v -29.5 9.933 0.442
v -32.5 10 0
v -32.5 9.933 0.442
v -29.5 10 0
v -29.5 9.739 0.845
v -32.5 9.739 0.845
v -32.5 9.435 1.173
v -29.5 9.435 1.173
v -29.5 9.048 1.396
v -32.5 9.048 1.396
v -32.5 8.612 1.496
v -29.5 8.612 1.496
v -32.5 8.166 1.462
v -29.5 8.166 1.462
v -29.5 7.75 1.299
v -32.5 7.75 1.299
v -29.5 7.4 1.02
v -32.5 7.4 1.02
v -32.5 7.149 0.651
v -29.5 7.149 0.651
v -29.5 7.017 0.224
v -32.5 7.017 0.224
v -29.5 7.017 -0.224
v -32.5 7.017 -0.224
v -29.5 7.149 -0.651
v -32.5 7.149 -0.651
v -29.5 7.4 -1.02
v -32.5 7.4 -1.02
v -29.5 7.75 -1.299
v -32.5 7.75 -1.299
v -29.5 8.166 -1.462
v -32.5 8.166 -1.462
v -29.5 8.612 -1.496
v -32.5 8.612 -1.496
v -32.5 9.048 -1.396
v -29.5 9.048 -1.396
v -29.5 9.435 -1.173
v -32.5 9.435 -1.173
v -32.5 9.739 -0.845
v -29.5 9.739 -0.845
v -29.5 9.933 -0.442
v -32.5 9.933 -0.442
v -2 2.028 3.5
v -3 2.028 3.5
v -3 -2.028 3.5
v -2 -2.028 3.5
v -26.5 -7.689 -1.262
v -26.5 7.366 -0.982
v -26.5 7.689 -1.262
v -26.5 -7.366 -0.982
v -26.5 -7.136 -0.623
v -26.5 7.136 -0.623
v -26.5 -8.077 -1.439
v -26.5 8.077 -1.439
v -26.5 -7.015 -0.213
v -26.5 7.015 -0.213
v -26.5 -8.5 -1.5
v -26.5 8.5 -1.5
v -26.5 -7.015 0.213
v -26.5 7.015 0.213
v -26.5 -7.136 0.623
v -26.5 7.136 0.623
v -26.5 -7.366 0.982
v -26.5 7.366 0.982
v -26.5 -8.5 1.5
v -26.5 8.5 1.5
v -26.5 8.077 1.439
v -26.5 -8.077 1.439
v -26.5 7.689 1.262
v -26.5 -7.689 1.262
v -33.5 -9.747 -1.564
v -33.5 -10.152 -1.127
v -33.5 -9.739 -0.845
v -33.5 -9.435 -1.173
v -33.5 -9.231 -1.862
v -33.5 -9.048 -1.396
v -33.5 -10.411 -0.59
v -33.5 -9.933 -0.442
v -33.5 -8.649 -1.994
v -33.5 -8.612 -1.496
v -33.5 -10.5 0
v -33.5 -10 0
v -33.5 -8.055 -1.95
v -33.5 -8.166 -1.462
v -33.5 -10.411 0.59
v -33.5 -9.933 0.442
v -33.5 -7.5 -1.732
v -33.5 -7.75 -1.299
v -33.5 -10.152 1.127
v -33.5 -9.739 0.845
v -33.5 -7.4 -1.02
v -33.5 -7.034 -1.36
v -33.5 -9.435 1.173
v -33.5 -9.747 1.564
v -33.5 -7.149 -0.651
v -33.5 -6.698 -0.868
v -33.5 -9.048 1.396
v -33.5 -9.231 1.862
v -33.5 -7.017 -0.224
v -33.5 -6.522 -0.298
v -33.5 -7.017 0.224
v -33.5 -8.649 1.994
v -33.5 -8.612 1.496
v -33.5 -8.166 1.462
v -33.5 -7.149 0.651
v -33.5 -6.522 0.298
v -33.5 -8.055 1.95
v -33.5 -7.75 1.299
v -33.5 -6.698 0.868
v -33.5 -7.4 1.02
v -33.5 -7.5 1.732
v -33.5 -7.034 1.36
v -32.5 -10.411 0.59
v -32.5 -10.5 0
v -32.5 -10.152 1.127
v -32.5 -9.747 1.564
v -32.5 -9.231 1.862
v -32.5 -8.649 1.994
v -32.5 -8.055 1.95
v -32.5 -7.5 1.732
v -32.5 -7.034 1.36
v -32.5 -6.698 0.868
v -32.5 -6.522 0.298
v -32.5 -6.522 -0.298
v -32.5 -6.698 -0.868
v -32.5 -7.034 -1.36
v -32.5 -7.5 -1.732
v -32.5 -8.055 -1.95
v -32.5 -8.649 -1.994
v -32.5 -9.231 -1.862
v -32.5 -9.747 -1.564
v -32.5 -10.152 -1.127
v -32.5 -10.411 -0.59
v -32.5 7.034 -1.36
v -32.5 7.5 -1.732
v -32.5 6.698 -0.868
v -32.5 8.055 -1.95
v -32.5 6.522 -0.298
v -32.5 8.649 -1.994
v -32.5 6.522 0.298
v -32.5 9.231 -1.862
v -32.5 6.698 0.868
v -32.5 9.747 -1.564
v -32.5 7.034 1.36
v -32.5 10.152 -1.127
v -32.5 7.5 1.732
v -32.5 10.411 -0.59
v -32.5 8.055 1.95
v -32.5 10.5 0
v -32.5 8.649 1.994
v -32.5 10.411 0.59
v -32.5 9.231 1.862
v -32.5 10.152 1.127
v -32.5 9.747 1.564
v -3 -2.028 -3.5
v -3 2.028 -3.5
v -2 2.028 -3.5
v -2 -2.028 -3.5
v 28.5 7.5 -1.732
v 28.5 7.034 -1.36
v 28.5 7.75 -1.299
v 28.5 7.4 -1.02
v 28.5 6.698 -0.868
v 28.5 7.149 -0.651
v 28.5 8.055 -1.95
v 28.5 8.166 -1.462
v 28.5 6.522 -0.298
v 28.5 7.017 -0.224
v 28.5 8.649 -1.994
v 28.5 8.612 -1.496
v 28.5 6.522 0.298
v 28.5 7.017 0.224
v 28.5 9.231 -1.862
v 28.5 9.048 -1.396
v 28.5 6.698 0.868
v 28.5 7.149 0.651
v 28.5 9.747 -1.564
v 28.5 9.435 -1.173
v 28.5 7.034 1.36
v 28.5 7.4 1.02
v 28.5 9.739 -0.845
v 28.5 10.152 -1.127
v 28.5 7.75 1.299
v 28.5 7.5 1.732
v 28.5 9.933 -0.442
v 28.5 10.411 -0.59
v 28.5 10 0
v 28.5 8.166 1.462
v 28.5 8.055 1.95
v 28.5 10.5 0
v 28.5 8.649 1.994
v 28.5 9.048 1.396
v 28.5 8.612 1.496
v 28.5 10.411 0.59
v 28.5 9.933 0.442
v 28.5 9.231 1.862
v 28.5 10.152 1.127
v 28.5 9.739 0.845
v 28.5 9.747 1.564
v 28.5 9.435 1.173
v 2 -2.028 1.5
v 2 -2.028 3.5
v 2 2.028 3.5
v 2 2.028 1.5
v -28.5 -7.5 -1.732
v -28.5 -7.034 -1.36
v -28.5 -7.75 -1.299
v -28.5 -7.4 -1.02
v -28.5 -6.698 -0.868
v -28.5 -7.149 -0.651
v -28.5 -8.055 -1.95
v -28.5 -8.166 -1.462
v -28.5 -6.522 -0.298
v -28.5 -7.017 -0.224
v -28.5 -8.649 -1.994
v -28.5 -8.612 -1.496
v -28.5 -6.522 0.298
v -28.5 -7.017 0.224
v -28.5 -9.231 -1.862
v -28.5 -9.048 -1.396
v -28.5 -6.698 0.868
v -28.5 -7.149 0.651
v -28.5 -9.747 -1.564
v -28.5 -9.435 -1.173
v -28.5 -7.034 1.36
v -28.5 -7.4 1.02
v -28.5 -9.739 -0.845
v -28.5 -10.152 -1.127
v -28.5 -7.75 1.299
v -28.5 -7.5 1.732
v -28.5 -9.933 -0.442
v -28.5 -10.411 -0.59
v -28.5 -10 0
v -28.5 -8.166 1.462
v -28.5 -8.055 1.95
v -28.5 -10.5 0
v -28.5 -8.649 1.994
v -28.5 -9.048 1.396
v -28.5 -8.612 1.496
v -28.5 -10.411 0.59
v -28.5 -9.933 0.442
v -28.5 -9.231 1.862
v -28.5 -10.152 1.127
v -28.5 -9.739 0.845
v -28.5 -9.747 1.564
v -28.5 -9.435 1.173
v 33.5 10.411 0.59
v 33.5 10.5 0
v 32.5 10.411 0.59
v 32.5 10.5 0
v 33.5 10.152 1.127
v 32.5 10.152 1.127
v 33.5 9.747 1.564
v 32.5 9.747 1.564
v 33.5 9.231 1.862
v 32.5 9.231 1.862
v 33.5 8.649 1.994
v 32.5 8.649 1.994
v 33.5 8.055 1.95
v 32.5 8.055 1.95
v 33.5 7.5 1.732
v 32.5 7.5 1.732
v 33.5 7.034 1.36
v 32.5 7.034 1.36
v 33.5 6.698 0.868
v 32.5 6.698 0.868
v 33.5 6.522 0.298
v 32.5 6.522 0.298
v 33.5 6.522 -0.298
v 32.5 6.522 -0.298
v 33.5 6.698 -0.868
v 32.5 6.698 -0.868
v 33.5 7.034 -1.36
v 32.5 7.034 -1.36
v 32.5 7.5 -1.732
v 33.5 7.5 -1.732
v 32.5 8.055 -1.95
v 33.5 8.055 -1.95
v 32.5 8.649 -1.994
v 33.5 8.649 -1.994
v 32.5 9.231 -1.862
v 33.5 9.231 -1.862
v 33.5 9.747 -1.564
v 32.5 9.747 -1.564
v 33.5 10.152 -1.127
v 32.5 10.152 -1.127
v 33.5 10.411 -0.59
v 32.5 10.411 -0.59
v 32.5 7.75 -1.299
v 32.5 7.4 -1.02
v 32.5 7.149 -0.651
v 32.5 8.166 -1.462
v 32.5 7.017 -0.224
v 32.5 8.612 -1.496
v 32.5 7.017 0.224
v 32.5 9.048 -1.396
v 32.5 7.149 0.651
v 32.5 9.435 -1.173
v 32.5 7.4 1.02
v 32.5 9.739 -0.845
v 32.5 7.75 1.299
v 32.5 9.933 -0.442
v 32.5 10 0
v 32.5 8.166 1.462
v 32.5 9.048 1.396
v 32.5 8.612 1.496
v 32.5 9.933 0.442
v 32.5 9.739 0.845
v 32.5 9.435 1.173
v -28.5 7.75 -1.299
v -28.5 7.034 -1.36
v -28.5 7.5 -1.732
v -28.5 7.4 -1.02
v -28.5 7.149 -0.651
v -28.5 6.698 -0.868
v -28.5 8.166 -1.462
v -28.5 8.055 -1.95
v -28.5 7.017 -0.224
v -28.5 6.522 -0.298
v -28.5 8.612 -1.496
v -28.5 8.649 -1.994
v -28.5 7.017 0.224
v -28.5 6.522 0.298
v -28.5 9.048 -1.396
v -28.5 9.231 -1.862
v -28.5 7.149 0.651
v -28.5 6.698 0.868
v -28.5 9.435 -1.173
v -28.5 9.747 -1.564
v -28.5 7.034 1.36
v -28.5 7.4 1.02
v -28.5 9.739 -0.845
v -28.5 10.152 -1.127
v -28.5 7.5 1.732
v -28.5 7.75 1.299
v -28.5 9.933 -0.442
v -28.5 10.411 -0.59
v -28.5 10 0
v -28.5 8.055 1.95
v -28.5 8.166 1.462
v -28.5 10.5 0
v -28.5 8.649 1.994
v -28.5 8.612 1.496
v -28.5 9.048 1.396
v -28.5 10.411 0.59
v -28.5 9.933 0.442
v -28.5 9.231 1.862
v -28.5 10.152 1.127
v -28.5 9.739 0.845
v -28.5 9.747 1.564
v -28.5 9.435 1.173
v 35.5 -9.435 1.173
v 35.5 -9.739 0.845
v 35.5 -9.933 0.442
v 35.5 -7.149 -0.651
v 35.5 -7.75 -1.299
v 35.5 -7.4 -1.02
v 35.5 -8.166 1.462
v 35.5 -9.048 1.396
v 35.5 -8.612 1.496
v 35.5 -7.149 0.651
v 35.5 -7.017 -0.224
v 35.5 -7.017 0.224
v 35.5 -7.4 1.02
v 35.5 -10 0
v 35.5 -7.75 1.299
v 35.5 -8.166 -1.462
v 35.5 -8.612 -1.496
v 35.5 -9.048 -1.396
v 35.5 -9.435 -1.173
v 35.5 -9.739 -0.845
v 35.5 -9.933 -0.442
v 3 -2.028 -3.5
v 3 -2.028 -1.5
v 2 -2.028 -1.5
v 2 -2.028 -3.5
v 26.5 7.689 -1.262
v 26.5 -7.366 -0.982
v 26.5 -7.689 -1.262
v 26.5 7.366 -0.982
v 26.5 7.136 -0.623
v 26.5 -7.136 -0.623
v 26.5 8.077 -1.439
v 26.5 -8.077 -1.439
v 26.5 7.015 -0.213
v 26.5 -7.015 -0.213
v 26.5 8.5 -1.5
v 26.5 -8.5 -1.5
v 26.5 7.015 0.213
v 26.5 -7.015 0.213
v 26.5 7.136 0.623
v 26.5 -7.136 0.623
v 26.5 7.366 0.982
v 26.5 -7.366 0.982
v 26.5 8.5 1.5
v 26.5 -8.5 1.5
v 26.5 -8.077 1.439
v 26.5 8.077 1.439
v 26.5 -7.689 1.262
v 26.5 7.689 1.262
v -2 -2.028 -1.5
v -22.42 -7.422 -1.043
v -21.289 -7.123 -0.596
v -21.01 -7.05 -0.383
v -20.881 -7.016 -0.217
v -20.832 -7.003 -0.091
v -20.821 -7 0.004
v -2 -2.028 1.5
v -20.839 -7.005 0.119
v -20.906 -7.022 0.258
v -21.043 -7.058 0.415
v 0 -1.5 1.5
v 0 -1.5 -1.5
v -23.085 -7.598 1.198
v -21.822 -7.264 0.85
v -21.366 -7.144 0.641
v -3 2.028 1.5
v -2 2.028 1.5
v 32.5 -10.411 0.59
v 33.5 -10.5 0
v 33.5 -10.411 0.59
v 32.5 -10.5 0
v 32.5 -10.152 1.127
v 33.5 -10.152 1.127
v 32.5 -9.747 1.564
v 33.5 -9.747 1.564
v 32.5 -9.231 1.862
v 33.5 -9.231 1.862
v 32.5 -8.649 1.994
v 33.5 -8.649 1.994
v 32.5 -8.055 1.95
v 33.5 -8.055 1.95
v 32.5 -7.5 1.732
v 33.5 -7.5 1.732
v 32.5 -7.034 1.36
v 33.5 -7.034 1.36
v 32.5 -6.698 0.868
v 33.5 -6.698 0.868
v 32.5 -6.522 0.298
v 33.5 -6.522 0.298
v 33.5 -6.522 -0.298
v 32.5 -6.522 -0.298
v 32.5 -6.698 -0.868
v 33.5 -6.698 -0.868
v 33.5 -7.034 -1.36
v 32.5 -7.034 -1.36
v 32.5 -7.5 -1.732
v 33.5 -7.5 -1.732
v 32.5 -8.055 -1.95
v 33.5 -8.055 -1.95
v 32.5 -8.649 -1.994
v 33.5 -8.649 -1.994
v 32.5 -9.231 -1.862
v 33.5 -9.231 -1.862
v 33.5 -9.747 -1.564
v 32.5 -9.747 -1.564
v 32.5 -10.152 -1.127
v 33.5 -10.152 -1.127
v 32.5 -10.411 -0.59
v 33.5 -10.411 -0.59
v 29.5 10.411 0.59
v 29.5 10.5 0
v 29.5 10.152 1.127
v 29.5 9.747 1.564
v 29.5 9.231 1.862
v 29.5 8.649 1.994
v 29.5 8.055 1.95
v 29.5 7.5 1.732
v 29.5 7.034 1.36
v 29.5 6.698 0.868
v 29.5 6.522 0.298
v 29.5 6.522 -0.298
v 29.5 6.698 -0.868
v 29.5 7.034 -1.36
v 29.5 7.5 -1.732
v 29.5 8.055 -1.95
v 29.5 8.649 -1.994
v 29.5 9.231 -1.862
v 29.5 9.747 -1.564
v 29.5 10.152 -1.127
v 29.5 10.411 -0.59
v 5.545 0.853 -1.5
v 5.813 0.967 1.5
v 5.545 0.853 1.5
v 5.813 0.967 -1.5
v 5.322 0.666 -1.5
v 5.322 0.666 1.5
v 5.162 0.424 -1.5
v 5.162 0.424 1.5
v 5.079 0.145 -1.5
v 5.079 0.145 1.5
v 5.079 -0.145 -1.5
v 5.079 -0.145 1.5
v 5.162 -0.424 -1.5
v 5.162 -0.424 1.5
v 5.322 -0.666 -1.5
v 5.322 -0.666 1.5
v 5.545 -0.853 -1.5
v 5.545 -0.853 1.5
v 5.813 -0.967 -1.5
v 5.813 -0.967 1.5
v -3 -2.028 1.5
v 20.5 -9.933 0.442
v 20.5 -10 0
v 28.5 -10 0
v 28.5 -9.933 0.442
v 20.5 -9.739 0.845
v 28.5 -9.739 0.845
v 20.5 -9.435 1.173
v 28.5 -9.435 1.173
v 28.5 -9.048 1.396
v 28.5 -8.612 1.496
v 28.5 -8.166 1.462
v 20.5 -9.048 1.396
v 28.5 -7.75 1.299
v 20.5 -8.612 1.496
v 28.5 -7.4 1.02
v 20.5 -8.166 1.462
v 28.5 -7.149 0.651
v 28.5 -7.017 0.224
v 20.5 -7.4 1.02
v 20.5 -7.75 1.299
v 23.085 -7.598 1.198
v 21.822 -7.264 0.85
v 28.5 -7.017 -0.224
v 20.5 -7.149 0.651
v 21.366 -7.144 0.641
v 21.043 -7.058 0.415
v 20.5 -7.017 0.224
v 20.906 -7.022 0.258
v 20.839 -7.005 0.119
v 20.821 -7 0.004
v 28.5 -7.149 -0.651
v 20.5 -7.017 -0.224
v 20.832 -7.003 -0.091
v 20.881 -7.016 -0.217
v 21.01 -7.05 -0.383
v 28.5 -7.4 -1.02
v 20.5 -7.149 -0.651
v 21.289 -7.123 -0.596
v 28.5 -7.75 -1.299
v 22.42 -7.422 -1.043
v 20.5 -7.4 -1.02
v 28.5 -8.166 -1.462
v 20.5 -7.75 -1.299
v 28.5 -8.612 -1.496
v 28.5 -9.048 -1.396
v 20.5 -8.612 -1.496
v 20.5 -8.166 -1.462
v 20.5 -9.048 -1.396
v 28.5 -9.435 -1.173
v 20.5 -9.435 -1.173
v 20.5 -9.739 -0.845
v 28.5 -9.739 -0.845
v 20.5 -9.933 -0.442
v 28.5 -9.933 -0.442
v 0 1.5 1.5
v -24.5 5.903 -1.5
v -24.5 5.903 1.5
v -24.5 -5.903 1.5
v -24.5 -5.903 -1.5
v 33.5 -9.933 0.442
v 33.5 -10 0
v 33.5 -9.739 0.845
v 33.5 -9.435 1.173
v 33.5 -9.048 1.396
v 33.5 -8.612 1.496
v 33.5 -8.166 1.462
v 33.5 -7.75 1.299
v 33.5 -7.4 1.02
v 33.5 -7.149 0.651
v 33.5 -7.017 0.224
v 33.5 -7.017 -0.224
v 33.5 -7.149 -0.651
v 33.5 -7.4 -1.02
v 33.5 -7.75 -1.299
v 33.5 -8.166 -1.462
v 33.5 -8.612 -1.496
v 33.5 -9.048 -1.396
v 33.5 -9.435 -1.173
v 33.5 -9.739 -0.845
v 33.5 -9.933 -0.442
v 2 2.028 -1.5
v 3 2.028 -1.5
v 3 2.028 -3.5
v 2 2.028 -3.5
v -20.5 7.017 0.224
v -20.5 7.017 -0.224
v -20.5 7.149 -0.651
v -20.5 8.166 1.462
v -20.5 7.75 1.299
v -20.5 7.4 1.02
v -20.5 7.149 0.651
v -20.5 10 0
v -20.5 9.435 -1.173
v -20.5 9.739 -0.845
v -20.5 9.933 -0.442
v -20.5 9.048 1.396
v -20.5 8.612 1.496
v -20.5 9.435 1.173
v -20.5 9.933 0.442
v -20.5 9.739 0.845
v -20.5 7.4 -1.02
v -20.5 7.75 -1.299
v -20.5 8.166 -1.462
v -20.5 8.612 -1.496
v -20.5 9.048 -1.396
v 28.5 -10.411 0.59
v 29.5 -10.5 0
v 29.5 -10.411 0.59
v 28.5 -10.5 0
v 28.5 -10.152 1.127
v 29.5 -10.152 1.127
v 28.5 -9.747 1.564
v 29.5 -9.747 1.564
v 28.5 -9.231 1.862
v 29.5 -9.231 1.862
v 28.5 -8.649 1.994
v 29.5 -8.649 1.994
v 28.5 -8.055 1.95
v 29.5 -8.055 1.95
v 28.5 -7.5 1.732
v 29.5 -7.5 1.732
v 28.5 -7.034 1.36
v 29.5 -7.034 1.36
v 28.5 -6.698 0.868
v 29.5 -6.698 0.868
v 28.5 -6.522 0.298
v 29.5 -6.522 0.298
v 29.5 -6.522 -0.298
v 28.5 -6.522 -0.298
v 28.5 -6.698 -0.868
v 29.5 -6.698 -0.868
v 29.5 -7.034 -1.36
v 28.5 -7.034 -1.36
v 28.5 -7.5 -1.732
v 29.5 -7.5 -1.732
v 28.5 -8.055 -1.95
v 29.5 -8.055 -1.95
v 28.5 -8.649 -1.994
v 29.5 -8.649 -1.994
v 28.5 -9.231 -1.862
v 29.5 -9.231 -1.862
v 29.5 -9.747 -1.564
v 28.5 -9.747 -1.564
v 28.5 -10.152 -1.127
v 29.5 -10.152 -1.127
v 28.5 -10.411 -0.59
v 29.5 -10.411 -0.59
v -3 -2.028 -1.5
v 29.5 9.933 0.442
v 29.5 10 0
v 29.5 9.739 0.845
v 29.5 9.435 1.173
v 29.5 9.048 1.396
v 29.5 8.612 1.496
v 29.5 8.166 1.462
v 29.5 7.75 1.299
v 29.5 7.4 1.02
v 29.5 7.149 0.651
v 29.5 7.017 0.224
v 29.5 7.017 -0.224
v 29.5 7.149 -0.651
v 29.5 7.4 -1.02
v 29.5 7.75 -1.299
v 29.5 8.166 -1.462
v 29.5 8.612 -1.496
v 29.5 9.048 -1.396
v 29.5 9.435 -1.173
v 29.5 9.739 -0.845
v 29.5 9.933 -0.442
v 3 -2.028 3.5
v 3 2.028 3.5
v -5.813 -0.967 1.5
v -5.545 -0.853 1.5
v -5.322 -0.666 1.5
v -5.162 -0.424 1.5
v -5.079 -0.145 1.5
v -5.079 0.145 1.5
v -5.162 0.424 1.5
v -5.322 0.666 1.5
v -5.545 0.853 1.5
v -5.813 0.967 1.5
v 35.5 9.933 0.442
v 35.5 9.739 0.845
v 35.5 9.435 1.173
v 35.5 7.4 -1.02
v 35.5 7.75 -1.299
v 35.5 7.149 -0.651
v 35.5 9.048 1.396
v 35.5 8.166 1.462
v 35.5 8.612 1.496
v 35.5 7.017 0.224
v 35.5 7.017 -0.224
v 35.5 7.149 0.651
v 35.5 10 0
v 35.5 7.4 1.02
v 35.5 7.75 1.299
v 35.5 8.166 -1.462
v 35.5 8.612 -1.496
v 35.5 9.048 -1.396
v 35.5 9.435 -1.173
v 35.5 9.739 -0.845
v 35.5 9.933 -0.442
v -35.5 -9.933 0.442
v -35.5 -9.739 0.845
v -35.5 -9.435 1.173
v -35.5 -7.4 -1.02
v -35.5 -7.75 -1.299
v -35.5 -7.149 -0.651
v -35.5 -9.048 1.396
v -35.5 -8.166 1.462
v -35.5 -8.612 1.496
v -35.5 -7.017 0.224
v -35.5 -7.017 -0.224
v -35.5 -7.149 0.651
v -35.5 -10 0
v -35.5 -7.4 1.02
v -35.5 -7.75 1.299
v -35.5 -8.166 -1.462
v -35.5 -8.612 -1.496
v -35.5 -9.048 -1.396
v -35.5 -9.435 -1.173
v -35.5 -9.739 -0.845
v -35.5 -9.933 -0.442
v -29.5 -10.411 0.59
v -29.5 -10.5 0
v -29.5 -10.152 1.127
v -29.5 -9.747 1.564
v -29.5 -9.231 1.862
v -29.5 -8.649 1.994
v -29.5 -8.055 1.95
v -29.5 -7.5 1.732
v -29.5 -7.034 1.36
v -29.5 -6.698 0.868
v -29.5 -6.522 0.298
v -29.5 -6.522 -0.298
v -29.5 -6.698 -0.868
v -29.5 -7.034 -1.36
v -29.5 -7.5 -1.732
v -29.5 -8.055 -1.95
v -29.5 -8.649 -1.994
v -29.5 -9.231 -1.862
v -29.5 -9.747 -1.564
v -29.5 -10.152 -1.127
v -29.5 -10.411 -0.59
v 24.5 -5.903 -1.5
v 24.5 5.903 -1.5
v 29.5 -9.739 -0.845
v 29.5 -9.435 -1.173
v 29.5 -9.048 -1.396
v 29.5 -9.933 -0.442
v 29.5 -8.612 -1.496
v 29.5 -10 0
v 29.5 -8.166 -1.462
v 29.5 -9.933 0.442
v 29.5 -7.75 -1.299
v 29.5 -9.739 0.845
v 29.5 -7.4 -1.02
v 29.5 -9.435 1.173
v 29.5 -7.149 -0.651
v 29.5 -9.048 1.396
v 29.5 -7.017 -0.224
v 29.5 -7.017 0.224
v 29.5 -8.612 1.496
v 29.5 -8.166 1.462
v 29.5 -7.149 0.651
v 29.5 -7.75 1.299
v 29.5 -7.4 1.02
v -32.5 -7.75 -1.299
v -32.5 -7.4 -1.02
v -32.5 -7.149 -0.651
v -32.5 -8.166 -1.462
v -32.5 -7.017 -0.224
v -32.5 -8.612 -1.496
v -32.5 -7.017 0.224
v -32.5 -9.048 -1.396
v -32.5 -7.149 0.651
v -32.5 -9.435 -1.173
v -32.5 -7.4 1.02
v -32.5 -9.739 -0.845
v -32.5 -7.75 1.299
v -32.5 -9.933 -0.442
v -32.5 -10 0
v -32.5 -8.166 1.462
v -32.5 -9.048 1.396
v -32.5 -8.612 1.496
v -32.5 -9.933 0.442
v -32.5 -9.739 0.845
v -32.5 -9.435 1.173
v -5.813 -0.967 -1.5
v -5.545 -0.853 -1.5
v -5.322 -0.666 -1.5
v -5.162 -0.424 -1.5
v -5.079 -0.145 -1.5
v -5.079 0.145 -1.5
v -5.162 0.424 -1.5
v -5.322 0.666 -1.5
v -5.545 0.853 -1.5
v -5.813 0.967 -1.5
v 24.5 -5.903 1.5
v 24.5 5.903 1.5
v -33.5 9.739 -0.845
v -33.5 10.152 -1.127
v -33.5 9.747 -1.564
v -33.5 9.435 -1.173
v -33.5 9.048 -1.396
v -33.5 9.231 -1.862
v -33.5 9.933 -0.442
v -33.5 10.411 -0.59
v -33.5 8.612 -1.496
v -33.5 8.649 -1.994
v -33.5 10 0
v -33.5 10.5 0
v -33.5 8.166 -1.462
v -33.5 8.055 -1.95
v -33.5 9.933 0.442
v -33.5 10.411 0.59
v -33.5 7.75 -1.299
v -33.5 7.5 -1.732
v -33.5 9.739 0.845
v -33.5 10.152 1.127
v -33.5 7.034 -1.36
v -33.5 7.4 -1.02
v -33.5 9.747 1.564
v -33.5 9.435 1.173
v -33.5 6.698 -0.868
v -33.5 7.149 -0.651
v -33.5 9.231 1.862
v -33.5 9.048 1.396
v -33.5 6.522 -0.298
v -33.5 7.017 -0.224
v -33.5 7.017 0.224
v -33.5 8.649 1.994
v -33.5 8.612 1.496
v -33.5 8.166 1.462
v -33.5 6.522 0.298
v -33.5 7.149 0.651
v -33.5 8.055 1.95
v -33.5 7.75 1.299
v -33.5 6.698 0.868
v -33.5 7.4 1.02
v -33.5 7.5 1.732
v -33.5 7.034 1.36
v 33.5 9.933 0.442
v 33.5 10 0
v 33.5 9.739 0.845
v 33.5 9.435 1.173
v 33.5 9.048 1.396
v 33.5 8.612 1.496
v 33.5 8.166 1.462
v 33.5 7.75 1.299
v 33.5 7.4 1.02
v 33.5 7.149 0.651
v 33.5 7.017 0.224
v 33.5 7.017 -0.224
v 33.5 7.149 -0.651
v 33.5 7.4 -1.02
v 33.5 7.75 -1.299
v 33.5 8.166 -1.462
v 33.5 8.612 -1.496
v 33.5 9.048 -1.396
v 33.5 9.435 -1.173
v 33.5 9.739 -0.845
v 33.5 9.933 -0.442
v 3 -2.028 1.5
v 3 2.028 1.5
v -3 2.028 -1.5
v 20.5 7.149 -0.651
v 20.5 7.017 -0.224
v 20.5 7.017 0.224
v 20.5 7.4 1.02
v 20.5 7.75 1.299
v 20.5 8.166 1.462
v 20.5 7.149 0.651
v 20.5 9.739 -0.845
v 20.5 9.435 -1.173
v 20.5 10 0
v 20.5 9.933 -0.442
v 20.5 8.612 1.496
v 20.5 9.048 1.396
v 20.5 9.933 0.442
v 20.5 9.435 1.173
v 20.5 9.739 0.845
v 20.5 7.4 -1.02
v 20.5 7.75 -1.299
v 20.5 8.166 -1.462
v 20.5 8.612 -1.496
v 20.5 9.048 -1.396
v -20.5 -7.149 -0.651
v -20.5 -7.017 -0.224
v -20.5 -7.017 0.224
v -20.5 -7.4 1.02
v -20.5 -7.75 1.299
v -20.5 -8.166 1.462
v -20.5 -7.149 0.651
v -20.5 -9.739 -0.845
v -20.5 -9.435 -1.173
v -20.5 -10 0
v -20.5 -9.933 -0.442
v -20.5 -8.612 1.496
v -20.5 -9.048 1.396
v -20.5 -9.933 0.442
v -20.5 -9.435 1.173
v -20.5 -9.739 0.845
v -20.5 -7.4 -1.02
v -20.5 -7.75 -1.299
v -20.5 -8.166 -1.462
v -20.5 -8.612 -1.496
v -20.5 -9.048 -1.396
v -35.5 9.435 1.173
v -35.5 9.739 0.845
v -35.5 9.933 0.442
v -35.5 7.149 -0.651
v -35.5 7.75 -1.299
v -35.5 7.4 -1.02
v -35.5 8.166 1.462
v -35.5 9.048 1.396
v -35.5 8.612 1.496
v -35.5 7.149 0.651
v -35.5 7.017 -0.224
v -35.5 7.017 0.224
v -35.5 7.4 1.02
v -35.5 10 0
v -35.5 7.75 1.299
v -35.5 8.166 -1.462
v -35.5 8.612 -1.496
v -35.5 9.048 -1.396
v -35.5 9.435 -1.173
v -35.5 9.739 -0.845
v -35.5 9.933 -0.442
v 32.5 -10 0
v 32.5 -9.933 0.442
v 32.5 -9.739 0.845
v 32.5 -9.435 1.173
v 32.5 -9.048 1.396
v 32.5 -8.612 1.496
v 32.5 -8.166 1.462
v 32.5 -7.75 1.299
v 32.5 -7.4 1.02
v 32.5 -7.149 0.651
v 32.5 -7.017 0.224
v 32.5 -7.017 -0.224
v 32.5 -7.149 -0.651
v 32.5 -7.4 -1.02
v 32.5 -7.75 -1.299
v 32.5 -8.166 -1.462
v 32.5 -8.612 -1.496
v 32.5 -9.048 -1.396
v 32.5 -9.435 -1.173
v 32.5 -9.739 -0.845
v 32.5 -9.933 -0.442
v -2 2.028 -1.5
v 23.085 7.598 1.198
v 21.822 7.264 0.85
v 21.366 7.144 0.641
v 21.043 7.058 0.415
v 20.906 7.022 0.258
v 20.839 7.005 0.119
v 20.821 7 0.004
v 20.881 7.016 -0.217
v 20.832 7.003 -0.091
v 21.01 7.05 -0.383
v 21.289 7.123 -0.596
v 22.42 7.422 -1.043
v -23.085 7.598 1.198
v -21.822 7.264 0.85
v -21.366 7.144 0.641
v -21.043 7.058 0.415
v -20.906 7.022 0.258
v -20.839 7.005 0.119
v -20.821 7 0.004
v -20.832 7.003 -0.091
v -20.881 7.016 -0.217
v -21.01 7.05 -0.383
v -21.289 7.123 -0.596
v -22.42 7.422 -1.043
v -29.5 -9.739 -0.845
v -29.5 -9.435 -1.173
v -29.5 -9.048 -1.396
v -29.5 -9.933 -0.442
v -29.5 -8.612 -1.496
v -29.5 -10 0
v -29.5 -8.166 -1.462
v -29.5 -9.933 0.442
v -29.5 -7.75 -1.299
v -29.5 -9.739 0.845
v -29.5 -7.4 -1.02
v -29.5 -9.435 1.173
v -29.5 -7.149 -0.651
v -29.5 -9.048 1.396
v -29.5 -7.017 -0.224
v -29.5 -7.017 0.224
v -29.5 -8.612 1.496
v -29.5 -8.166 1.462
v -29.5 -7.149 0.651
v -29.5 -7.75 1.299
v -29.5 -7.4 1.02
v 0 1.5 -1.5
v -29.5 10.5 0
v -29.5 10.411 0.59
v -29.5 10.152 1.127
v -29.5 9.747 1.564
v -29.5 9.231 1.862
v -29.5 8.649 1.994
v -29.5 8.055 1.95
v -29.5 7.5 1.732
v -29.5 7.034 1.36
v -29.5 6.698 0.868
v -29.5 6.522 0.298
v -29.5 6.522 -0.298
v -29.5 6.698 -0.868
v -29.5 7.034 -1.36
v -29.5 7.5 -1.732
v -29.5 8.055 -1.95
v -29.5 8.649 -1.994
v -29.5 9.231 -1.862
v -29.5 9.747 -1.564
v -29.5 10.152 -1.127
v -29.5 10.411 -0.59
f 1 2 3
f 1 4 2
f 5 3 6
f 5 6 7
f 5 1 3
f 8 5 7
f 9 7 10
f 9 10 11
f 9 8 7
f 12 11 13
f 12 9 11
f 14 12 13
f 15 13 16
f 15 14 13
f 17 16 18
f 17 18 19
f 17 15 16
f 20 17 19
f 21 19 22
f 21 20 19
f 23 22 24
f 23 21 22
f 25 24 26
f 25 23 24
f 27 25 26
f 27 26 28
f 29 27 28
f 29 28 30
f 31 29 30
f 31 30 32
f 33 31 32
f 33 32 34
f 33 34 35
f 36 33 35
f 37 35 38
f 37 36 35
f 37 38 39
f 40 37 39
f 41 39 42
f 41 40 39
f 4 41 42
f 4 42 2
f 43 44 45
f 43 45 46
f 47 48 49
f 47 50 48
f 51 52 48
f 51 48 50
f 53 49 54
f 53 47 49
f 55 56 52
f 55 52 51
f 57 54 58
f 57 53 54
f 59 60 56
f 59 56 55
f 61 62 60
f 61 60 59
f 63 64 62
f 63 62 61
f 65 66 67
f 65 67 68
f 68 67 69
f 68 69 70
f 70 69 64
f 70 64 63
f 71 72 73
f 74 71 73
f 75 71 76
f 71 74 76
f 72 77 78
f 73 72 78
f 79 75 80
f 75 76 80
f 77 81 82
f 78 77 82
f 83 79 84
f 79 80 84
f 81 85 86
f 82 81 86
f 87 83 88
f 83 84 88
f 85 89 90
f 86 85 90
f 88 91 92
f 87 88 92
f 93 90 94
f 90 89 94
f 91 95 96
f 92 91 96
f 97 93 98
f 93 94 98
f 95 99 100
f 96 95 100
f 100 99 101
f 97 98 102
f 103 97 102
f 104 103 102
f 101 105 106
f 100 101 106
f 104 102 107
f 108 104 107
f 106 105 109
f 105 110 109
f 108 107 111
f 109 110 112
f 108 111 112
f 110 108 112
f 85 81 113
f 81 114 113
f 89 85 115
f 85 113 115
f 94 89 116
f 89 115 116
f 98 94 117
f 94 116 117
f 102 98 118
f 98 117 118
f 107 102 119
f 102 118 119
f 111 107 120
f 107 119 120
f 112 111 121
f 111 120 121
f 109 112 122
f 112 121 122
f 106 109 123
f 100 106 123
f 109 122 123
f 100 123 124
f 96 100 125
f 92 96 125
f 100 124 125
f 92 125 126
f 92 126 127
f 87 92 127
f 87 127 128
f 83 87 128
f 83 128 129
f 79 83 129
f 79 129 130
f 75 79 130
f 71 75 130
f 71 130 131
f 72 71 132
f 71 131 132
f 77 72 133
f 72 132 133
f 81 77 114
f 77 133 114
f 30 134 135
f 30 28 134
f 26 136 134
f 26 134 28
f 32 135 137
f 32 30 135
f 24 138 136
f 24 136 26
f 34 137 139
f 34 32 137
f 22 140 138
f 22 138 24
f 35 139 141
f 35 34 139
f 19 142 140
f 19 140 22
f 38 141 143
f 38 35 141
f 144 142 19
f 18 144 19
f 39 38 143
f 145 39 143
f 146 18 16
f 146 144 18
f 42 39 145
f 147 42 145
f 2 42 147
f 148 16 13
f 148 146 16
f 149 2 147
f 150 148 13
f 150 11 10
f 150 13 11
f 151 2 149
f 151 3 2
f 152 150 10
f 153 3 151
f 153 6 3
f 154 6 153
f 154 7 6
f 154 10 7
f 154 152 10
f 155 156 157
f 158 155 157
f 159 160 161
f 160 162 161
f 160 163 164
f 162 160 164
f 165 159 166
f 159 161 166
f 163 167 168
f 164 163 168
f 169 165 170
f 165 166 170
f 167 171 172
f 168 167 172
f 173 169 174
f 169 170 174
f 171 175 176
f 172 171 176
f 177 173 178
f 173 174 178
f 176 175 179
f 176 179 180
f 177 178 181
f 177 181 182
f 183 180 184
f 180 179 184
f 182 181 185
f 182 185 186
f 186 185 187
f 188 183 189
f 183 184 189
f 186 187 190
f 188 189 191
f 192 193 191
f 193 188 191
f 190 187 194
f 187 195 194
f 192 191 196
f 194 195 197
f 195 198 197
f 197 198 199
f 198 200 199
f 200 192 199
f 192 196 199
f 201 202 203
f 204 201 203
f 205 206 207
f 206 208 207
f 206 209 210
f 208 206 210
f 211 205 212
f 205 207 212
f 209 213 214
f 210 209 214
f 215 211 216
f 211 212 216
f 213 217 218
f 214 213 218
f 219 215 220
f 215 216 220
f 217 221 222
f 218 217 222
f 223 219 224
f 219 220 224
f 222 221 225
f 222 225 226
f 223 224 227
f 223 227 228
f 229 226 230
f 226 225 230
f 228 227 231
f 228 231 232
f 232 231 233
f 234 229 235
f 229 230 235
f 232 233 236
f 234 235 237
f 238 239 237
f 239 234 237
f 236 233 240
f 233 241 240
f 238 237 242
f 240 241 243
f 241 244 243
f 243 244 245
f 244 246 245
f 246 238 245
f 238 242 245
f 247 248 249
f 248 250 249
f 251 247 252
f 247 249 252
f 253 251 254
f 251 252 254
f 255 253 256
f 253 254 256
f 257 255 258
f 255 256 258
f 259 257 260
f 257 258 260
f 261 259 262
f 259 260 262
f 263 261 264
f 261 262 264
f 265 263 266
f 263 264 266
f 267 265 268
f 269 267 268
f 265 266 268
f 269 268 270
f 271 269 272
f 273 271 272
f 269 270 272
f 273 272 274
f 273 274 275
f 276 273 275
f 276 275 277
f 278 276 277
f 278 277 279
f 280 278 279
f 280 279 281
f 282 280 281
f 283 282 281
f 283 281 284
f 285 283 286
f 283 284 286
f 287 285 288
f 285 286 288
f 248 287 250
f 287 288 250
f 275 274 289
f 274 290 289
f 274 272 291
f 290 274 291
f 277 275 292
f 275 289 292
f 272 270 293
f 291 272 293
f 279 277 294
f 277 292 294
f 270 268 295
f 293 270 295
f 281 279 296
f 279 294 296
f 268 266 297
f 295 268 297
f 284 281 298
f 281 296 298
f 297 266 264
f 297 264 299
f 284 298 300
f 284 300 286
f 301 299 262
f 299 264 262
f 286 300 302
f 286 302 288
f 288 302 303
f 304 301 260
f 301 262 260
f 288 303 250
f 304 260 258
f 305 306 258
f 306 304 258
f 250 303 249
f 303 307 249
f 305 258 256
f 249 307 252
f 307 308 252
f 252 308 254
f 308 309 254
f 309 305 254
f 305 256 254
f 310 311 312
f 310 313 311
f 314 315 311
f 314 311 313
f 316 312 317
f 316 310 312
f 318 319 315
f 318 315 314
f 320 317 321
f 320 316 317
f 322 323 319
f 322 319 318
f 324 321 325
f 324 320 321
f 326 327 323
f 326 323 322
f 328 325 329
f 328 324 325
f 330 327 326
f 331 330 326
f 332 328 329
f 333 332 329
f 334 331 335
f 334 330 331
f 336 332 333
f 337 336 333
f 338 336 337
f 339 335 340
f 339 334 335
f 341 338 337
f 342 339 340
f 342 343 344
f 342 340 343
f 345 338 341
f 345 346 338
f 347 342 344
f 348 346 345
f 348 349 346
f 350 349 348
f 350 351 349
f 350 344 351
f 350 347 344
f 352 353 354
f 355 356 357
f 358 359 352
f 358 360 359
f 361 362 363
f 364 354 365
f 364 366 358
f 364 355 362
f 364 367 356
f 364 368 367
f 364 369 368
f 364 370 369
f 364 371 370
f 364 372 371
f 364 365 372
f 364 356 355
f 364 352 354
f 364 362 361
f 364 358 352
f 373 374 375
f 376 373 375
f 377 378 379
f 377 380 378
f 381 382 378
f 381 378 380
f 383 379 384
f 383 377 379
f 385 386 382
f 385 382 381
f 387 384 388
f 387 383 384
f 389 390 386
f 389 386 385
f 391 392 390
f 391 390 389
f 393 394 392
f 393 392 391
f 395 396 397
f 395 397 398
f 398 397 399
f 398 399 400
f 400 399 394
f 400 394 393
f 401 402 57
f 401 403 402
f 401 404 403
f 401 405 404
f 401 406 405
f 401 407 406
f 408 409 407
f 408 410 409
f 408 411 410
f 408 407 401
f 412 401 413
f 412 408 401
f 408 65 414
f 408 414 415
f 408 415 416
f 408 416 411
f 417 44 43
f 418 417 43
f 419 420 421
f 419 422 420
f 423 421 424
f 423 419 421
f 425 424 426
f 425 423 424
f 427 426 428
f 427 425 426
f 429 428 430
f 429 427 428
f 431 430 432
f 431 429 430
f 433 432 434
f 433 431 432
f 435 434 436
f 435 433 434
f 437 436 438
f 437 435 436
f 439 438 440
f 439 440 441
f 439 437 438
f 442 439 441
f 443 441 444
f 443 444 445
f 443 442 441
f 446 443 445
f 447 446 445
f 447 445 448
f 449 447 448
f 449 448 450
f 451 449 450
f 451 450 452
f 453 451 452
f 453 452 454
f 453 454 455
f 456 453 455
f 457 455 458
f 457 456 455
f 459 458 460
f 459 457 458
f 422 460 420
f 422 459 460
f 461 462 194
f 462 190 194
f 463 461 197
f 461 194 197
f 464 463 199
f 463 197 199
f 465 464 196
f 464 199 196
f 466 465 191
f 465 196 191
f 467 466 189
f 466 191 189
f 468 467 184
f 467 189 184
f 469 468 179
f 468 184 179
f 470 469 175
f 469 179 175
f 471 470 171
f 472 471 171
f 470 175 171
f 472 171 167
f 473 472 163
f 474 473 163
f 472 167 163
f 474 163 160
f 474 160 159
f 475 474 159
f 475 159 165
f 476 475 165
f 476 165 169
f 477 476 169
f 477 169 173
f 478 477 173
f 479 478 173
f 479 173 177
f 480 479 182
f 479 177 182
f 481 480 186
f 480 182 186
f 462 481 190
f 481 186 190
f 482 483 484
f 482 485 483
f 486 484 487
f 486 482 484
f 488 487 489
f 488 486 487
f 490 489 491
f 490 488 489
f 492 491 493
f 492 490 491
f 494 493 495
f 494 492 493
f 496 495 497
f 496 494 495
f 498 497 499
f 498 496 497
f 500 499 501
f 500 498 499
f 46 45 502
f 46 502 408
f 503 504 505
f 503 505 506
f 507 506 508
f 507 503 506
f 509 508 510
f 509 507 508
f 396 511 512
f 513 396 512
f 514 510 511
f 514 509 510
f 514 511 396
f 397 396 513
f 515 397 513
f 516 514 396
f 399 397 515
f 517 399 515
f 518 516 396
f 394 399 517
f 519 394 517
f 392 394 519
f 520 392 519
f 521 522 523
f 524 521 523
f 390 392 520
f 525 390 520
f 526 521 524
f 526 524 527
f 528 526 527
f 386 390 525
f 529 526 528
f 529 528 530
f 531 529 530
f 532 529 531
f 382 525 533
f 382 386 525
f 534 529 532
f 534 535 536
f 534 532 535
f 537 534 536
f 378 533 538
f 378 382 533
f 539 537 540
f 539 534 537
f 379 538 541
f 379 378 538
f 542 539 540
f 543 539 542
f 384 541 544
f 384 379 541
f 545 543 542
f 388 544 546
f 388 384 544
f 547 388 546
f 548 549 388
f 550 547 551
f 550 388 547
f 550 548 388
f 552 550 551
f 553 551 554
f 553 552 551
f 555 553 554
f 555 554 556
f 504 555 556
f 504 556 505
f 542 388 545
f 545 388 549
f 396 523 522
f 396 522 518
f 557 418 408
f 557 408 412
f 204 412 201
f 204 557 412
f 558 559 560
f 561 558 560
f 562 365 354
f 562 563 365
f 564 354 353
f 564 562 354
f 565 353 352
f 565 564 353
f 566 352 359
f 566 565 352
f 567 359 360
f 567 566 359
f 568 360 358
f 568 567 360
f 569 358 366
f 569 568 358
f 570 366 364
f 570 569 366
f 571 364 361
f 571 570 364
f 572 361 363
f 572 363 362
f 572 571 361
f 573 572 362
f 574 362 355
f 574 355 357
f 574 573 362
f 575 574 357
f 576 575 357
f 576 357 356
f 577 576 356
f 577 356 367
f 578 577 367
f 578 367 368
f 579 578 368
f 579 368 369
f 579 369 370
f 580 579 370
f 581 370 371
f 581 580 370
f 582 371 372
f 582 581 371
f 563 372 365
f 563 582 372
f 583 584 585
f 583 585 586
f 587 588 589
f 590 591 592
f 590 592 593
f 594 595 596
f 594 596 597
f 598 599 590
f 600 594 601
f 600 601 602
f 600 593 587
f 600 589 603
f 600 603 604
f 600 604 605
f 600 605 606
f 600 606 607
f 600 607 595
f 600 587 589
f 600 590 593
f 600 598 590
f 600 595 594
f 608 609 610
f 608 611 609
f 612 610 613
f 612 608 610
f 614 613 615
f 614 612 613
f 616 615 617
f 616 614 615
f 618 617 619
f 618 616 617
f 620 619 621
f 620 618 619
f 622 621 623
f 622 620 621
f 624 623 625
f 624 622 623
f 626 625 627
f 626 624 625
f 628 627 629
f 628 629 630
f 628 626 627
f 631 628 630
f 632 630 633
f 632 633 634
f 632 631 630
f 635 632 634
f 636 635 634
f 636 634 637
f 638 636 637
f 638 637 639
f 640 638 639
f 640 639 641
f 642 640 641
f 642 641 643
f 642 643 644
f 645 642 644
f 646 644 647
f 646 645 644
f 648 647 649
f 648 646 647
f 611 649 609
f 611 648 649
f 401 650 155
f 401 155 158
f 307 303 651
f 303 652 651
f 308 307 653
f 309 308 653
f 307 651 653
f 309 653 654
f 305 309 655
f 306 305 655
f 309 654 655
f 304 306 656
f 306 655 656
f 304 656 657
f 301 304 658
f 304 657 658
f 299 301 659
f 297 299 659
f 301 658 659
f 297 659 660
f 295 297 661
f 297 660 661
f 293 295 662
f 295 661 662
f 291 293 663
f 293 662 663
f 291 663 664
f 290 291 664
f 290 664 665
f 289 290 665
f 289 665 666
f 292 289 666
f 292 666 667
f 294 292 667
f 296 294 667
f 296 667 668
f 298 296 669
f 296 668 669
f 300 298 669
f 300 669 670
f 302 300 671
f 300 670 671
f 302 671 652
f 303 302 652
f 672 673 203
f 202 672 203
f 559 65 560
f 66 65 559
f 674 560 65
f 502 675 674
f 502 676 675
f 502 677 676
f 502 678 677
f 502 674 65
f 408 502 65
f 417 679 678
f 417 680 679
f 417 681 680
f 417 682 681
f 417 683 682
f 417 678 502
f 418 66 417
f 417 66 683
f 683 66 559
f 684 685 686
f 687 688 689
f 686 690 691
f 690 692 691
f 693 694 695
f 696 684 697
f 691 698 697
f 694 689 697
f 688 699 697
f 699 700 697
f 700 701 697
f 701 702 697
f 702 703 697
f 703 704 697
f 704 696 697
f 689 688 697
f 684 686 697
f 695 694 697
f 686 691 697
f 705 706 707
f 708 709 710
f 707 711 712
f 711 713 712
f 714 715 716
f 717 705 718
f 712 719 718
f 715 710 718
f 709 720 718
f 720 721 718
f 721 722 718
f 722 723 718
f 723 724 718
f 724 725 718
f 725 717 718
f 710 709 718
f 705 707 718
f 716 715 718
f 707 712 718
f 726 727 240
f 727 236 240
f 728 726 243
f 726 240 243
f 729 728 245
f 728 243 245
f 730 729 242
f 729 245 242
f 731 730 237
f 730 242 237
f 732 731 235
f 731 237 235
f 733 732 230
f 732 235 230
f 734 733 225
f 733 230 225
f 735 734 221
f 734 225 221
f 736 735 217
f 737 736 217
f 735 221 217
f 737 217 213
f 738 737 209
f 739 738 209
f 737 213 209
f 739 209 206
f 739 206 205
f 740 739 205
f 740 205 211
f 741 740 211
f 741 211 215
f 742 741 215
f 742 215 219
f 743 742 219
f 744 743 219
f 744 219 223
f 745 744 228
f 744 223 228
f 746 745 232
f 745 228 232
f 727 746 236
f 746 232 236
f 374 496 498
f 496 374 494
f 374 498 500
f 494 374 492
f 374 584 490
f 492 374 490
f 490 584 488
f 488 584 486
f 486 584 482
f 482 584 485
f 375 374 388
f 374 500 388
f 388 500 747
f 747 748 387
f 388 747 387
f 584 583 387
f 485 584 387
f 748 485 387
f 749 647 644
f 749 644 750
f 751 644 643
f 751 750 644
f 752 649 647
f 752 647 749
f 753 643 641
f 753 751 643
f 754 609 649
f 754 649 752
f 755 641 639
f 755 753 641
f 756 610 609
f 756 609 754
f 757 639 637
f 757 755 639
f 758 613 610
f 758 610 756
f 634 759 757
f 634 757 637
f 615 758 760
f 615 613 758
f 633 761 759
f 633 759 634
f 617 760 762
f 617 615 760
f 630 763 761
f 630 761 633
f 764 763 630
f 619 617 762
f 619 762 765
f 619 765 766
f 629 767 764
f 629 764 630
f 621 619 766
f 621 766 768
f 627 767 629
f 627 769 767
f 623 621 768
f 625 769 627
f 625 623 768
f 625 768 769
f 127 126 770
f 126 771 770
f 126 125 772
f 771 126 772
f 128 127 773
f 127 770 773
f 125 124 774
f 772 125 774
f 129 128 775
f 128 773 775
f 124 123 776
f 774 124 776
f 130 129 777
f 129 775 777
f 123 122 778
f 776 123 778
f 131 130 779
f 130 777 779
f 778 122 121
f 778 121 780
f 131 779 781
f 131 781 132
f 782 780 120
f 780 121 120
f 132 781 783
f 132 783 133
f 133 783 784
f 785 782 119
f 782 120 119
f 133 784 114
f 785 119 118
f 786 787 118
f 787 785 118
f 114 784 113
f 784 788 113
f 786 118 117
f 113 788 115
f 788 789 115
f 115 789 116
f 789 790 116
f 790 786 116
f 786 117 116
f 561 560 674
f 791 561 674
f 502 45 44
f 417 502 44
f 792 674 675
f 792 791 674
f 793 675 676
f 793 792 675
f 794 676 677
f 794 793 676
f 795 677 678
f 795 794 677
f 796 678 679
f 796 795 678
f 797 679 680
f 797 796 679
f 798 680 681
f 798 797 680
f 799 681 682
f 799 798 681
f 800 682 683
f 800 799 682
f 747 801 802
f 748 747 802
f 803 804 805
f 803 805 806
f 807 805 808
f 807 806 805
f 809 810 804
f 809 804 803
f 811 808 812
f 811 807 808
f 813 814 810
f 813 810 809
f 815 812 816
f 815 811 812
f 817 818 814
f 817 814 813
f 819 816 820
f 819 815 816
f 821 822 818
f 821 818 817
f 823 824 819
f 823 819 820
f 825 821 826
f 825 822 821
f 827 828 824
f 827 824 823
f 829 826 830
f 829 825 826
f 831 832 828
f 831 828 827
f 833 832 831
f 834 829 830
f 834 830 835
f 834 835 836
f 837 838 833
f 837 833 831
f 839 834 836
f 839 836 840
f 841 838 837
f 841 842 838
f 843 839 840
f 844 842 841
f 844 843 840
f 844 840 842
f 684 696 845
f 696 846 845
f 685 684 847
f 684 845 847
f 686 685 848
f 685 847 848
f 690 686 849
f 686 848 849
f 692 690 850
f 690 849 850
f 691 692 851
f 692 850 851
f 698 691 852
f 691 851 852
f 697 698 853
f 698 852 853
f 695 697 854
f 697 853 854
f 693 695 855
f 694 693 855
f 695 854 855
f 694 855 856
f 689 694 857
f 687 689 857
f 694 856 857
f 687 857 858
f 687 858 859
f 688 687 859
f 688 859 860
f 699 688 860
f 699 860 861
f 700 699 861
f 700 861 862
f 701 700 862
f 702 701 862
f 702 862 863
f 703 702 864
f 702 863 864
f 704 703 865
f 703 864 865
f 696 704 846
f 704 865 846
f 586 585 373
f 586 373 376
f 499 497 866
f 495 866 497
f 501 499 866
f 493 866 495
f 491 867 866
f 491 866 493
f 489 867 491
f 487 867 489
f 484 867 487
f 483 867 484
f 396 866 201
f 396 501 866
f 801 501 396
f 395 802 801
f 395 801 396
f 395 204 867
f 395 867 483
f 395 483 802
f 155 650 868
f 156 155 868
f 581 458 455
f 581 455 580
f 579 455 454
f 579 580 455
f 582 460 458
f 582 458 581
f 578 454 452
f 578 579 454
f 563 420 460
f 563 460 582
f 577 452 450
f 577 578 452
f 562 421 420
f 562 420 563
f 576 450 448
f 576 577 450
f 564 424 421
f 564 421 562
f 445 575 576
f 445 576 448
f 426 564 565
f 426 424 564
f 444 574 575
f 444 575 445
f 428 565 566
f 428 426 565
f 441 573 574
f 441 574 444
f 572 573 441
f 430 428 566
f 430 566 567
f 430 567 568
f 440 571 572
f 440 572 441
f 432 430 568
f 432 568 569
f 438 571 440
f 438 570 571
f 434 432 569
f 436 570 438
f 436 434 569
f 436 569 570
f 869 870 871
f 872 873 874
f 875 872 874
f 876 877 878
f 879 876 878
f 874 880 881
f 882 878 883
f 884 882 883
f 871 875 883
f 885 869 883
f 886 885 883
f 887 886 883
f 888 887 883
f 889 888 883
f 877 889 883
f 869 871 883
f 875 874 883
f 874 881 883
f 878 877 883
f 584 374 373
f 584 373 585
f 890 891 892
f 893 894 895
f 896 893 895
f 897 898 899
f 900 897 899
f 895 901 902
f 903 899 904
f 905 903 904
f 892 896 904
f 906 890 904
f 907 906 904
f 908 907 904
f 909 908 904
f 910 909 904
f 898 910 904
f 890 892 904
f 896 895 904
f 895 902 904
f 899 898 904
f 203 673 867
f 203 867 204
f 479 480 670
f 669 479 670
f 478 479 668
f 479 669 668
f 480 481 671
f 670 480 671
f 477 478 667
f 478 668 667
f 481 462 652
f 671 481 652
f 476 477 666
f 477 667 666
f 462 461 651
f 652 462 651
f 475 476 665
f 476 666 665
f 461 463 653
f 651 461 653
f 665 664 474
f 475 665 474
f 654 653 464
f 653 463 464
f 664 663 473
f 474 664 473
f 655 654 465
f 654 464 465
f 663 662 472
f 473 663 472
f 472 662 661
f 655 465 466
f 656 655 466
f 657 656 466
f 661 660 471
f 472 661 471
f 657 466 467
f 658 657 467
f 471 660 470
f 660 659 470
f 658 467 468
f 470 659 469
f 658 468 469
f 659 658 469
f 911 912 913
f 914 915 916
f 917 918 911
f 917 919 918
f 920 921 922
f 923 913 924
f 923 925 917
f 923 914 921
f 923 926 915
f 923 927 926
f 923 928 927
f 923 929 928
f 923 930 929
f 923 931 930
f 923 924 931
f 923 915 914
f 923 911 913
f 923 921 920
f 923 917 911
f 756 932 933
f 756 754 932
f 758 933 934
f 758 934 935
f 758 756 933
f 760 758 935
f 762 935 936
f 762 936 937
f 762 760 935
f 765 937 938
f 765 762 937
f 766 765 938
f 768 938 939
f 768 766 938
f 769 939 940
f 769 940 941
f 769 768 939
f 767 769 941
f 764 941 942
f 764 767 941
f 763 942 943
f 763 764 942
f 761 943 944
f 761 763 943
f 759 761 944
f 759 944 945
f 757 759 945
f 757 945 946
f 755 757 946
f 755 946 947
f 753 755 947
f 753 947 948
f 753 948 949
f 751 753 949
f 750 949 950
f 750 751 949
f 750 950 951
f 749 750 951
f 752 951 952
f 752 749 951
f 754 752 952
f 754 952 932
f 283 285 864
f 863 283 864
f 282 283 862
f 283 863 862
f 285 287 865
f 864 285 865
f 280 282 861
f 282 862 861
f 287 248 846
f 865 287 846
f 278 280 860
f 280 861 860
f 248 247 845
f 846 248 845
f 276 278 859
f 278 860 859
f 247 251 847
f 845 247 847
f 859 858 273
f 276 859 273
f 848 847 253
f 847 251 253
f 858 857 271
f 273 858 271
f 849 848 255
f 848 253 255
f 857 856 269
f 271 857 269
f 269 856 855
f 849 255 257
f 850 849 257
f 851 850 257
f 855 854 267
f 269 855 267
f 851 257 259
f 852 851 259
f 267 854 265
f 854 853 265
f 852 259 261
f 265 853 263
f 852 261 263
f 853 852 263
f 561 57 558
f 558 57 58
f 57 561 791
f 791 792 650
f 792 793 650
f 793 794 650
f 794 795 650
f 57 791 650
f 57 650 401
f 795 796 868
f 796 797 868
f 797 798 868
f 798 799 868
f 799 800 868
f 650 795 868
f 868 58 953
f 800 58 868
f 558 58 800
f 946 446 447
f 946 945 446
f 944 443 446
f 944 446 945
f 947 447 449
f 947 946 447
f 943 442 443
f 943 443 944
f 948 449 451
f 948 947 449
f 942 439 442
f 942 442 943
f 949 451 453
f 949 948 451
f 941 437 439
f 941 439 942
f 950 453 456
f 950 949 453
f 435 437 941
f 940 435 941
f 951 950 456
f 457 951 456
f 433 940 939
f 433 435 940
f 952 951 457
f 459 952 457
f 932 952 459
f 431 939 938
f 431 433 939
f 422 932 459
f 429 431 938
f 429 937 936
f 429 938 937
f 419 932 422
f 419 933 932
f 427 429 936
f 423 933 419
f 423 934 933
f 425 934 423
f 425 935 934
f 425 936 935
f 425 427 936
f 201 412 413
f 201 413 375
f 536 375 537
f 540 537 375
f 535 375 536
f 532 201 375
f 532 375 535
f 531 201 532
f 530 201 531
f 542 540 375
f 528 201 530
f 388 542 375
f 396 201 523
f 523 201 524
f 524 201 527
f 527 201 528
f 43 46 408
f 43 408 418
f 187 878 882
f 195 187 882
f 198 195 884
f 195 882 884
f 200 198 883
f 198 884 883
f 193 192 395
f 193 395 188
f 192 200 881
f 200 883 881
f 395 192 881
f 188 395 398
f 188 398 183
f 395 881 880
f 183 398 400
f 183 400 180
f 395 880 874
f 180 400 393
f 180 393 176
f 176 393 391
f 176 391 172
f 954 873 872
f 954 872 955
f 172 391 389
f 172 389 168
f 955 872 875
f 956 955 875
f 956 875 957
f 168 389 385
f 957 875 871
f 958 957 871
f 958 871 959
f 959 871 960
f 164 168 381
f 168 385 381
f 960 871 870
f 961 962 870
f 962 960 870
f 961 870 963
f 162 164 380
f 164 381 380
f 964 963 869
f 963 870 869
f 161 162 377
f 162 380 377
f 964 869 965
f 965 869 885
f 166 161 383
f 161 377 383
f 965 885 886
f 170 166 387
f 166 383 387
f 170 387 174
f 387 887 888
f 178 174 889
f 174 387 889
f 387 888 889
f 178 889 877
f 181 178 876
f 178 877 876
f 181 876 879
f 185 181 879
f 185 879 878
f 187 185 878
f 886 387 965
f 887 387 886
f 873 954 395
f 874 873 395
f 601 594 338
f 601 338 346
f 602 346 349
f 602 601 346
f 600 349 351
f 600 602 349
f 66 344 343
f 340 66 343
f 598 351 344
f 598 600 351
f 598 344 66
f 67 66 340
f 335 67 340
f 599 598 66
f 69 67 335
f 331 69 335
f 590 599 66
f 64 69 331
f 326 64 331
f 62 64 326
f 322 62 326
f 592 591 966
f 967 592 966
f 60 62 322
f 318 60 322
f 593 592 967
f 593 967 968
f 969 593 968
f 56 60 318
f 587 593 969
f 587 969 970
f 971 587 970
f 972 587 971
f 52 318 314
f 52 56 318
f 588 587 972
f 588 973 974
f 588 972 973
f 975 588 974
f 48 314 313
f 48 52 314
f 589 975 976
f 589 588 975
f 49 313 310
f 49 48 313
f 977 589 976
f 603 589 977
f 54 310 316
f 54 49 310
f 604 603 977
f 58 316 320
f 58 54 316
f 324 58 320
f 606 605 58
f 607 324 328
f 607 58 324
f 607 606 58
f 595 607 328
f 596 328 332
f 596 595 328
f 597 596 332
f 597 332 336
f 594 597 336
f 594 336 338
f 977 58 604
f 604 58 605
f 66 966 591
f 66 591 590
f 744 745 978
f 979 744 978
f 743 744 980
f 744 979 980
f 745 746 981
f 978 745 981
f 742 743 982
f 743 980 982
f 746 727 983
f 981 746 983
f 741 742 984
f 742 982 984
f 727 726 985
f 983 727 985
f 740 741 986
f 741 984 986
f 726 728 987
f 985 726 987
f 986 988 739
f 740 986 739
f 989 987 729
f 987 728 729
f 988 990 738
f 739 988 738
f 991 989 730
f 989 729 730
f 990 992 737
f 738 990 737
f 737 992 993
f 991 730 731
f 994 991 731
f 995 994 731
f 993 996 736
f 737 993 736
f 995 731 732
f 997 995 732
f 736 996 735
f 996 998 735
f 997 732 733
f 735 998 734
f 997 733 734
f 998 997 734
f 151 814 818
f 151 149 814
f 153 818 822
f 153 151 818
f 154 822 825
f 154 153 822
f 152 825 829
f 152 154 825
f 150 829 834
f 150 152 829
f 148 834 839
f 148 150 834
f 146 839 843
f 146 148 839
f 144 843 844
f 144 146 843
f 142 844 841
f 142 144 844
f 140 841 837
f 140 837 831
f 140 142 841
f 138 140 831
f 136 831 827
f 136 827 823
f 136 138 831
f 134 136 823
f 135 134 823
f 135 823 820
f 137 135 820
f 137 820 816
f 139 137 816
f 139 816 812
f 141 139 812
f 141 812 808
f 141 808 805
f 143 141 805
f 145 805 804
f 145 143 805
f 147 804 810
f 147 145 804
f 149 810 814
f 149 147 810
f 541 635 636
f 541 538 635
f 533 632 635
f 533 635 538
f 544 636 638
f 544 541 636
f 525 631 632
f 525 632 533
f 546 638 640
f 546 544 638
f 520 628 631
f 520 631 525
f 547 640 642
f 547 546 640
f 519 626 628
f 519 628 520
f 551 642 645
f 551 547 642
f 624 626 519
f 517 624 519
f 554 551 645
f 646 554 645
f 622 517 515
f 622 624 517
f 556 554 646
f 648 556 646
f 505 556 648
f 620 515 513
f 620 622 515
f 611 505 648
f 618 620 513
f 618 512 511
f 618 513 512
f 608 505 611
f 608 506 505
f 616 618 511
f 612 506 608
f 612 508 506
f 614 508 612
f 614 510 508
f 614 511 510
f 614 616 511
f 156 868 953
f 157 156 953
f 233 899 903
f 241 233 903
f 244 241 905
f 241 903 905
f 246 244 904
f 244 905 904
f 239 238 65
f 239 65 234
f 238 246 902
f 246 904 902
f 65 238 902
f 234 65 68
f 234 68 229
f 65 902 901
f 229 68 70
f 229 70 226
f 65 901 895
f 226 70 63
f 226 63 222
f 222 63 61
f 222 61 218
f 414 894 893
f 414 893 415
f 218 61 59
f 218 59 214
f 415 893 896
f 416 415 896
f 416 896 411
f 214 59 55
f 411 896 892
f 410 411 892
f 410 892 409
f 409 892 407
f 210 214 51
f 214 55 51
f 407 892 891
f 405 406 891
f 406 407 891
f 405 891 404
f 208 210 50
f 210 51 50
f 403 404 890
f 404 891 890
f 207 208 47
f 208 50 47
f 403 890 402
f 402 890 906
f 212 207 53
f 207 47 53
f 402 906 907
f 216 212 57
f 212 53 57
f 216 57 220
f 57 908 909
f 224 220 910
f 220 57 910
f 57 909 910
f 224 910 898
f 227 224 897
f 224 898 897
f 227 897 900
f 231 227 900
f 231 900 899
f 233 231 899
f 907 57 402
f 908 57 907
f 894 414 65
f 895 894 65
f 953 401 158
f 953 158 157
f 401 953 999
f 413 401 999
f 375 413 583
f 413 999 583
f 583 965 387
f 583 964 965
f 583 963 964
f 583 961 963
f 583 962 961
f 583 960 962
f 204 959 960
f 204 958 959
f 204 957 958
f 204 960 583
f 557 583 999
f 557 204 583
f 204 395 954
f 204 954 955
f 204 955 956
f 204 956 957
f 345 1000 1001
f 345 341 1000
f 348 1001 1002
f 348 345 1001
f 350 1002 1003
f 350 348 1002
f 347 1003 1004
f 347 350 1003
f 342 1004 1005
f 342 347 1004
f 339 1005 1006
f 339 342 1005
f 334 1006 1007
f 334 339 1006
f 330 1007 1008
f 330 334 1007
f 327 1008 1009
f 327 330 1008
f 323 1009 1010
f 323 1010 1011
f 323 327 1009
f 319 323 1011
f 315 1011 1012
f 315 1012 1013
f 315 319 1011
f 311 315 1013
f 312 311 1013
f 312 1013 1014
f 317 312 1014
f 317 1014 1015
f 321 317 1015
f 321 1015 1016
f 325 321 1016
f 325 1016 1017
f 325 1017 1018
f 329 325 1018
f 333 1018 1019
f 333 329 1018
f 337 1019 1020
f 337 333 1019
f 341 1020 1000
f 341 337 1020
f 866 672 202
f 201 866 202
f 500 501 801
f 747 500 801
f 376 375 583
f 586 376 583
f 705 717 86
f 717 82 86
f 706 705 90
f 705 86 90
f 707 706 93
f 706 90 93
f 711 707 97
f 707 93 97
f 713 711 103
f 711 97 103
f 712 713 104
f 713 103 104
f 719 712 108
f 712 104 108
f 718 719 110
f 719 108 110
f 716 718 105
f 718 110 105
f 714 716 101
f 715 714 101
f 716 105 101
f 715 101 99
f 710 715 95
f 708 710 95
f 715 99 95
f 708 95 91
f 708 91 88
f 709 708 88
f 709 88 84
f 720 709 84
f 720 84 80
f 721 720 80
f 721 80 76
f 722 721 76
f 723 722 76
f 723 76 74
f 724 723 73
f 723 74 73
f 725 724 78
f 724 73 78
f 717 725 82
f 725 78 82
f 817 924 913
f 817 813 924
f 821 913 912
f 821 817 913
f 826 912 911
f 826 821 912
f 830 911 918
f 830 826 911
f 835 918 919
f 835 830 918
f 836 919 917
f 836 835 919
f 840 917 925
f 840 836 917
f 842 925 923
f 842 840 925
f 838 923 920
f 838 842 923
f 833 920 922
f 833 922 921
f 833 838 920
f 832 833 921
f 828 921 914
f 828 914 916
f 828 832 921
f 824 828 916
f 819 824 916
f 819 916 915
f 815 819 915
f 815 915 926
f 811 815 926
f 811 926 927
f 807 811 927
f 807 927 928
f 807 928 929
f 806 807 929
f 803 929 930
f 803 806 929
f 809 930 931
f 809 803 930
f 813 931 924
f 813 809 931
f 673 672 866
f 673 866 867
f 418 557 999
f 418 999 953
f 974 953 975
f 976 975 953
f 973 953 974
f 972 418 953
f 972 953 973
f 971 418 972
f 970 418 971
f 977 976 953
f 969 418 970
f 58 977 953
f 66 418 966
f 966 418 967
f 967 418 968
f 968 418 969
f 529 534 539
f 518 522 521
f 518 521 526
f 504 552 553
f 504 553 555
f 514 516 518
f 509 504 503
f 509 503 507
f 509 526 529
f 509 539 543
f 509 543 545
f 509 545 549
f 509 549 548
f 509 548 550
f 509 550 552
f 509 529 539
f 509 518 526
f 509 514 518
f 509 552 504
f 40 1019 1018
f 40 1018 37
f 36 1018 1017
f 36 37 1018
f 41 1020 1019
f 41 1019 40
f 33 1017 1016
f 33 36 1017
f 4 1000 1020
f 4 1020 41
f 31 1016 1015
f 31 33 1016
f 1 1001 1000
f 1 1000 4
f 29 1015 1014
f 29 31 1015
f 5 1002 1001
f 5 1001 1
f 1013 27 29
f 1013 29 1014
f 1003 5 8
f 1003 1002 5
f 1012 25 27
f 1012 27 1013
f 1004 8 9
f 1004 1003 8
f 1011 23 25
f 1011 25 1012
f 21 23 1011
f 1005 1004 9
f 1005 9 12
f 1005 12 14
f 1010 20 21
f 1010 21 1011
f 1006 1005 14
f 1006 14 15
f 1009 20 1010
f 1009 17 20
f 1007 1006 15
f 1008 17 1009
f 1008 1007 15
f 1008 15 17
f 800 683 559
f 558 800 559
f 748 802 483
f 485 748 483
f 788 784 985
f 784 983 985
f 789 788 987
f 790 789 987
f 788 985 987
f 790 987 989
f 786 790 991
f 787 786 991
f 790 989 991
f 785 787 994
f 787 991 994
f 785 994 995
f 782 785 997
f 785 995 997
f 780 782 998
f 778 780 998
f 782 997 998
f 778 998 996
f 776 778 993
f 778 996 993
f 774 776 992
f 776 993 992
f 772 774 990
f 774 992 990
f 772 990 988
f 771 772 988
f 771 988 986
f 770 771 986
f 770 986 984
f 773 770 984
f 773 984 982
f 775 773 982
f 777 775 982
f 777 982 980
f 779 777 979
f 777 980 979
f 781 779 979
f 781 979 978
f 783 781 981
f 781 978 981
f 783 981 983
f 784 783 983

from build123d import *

# Parameters (mm, degrees)
F1_DEPTH = 1.5
F3_DEPTH = 3.001
F4_R     = 1
F7_W     = 1
F7_H     = 4.0566037736
F8_DEPTH = 3.5


# Not quite as in the source:
# - a feature names something its author has since deleted; it is built from what else it names


with BuildPart() as f1:
    # F0 (on Top) → F1 (new body, symmetric)
    with BuildSketch(Plane.XY):
        Polygon((0, 1.5), (-26.5, 8.5), (-26.5, 0), (-26.5, -8.5), (0, -1.5), (26.5, -8.5), (26.5, 0), (26.5, 8.5), align=None)
    extrude(amount=F1_DEPTH, both=True)

    # F2 (on face) → F3 (cut, through all)
    with BuildSketch(Plane.XY.offset(1.5)):
        Polygon((-24.5, 5.9030988568), (-24.5, 0), (-24.5, -5.9030988568), (-2.1525543278, 0), align=None)
        Polygon((24.5, 0), (24.5, 5.9030988568), (2.1525543278, 0), (24.5, -5.9030988568), align=None)
    extrude(amount=-F3_DEPTH, mode=Mode.SUBTRACT)

    # F4
    f4_edges = [f1.edges().sort_by_distance(p)[0] for p in [
        (-2.152554, 0, 0),
        (2.152554, 0, 0),
    ]]
    fillet(f4_edges, radius=F4_R)

    # F5 (on Top) → F6 (revolve)
    with BuildSketch(Plane.XY):
        Polygon((20.5, 8.5), (35.5, 8.5), (35.5, 10), (33.5, 10), (33.5, 10.5), (32.5, 10.5), (32.5, 10), (29.5, 10), (29.5, 10.5), (28.5, 10.5), (28.5, 10), (20.5, 10), align=None)
    revolve(axis=Axis((28, 8.5, 0), (1, 0, 0)))

    # F7 (on Top) → F8 (join, symmetric)
    with BuildSketch(Plane.XY):
        with Locations((-2.5, 0)):
            Rectangle(F7_W, F7_H)
    extrude(amount=F8_DEPTH, both=True)

    # F9: F1 across plane


with BuildPart() as f1_1:
    add(f1.part)
    add(f1.part.mirror(Plane.YZ))

    # F10: F1 across plane


with BuildPart() as f1_2:
    add(f1_1.part)
    add(f1_1.part.mirror(Plane.XZ))


solid = f1_2.part
